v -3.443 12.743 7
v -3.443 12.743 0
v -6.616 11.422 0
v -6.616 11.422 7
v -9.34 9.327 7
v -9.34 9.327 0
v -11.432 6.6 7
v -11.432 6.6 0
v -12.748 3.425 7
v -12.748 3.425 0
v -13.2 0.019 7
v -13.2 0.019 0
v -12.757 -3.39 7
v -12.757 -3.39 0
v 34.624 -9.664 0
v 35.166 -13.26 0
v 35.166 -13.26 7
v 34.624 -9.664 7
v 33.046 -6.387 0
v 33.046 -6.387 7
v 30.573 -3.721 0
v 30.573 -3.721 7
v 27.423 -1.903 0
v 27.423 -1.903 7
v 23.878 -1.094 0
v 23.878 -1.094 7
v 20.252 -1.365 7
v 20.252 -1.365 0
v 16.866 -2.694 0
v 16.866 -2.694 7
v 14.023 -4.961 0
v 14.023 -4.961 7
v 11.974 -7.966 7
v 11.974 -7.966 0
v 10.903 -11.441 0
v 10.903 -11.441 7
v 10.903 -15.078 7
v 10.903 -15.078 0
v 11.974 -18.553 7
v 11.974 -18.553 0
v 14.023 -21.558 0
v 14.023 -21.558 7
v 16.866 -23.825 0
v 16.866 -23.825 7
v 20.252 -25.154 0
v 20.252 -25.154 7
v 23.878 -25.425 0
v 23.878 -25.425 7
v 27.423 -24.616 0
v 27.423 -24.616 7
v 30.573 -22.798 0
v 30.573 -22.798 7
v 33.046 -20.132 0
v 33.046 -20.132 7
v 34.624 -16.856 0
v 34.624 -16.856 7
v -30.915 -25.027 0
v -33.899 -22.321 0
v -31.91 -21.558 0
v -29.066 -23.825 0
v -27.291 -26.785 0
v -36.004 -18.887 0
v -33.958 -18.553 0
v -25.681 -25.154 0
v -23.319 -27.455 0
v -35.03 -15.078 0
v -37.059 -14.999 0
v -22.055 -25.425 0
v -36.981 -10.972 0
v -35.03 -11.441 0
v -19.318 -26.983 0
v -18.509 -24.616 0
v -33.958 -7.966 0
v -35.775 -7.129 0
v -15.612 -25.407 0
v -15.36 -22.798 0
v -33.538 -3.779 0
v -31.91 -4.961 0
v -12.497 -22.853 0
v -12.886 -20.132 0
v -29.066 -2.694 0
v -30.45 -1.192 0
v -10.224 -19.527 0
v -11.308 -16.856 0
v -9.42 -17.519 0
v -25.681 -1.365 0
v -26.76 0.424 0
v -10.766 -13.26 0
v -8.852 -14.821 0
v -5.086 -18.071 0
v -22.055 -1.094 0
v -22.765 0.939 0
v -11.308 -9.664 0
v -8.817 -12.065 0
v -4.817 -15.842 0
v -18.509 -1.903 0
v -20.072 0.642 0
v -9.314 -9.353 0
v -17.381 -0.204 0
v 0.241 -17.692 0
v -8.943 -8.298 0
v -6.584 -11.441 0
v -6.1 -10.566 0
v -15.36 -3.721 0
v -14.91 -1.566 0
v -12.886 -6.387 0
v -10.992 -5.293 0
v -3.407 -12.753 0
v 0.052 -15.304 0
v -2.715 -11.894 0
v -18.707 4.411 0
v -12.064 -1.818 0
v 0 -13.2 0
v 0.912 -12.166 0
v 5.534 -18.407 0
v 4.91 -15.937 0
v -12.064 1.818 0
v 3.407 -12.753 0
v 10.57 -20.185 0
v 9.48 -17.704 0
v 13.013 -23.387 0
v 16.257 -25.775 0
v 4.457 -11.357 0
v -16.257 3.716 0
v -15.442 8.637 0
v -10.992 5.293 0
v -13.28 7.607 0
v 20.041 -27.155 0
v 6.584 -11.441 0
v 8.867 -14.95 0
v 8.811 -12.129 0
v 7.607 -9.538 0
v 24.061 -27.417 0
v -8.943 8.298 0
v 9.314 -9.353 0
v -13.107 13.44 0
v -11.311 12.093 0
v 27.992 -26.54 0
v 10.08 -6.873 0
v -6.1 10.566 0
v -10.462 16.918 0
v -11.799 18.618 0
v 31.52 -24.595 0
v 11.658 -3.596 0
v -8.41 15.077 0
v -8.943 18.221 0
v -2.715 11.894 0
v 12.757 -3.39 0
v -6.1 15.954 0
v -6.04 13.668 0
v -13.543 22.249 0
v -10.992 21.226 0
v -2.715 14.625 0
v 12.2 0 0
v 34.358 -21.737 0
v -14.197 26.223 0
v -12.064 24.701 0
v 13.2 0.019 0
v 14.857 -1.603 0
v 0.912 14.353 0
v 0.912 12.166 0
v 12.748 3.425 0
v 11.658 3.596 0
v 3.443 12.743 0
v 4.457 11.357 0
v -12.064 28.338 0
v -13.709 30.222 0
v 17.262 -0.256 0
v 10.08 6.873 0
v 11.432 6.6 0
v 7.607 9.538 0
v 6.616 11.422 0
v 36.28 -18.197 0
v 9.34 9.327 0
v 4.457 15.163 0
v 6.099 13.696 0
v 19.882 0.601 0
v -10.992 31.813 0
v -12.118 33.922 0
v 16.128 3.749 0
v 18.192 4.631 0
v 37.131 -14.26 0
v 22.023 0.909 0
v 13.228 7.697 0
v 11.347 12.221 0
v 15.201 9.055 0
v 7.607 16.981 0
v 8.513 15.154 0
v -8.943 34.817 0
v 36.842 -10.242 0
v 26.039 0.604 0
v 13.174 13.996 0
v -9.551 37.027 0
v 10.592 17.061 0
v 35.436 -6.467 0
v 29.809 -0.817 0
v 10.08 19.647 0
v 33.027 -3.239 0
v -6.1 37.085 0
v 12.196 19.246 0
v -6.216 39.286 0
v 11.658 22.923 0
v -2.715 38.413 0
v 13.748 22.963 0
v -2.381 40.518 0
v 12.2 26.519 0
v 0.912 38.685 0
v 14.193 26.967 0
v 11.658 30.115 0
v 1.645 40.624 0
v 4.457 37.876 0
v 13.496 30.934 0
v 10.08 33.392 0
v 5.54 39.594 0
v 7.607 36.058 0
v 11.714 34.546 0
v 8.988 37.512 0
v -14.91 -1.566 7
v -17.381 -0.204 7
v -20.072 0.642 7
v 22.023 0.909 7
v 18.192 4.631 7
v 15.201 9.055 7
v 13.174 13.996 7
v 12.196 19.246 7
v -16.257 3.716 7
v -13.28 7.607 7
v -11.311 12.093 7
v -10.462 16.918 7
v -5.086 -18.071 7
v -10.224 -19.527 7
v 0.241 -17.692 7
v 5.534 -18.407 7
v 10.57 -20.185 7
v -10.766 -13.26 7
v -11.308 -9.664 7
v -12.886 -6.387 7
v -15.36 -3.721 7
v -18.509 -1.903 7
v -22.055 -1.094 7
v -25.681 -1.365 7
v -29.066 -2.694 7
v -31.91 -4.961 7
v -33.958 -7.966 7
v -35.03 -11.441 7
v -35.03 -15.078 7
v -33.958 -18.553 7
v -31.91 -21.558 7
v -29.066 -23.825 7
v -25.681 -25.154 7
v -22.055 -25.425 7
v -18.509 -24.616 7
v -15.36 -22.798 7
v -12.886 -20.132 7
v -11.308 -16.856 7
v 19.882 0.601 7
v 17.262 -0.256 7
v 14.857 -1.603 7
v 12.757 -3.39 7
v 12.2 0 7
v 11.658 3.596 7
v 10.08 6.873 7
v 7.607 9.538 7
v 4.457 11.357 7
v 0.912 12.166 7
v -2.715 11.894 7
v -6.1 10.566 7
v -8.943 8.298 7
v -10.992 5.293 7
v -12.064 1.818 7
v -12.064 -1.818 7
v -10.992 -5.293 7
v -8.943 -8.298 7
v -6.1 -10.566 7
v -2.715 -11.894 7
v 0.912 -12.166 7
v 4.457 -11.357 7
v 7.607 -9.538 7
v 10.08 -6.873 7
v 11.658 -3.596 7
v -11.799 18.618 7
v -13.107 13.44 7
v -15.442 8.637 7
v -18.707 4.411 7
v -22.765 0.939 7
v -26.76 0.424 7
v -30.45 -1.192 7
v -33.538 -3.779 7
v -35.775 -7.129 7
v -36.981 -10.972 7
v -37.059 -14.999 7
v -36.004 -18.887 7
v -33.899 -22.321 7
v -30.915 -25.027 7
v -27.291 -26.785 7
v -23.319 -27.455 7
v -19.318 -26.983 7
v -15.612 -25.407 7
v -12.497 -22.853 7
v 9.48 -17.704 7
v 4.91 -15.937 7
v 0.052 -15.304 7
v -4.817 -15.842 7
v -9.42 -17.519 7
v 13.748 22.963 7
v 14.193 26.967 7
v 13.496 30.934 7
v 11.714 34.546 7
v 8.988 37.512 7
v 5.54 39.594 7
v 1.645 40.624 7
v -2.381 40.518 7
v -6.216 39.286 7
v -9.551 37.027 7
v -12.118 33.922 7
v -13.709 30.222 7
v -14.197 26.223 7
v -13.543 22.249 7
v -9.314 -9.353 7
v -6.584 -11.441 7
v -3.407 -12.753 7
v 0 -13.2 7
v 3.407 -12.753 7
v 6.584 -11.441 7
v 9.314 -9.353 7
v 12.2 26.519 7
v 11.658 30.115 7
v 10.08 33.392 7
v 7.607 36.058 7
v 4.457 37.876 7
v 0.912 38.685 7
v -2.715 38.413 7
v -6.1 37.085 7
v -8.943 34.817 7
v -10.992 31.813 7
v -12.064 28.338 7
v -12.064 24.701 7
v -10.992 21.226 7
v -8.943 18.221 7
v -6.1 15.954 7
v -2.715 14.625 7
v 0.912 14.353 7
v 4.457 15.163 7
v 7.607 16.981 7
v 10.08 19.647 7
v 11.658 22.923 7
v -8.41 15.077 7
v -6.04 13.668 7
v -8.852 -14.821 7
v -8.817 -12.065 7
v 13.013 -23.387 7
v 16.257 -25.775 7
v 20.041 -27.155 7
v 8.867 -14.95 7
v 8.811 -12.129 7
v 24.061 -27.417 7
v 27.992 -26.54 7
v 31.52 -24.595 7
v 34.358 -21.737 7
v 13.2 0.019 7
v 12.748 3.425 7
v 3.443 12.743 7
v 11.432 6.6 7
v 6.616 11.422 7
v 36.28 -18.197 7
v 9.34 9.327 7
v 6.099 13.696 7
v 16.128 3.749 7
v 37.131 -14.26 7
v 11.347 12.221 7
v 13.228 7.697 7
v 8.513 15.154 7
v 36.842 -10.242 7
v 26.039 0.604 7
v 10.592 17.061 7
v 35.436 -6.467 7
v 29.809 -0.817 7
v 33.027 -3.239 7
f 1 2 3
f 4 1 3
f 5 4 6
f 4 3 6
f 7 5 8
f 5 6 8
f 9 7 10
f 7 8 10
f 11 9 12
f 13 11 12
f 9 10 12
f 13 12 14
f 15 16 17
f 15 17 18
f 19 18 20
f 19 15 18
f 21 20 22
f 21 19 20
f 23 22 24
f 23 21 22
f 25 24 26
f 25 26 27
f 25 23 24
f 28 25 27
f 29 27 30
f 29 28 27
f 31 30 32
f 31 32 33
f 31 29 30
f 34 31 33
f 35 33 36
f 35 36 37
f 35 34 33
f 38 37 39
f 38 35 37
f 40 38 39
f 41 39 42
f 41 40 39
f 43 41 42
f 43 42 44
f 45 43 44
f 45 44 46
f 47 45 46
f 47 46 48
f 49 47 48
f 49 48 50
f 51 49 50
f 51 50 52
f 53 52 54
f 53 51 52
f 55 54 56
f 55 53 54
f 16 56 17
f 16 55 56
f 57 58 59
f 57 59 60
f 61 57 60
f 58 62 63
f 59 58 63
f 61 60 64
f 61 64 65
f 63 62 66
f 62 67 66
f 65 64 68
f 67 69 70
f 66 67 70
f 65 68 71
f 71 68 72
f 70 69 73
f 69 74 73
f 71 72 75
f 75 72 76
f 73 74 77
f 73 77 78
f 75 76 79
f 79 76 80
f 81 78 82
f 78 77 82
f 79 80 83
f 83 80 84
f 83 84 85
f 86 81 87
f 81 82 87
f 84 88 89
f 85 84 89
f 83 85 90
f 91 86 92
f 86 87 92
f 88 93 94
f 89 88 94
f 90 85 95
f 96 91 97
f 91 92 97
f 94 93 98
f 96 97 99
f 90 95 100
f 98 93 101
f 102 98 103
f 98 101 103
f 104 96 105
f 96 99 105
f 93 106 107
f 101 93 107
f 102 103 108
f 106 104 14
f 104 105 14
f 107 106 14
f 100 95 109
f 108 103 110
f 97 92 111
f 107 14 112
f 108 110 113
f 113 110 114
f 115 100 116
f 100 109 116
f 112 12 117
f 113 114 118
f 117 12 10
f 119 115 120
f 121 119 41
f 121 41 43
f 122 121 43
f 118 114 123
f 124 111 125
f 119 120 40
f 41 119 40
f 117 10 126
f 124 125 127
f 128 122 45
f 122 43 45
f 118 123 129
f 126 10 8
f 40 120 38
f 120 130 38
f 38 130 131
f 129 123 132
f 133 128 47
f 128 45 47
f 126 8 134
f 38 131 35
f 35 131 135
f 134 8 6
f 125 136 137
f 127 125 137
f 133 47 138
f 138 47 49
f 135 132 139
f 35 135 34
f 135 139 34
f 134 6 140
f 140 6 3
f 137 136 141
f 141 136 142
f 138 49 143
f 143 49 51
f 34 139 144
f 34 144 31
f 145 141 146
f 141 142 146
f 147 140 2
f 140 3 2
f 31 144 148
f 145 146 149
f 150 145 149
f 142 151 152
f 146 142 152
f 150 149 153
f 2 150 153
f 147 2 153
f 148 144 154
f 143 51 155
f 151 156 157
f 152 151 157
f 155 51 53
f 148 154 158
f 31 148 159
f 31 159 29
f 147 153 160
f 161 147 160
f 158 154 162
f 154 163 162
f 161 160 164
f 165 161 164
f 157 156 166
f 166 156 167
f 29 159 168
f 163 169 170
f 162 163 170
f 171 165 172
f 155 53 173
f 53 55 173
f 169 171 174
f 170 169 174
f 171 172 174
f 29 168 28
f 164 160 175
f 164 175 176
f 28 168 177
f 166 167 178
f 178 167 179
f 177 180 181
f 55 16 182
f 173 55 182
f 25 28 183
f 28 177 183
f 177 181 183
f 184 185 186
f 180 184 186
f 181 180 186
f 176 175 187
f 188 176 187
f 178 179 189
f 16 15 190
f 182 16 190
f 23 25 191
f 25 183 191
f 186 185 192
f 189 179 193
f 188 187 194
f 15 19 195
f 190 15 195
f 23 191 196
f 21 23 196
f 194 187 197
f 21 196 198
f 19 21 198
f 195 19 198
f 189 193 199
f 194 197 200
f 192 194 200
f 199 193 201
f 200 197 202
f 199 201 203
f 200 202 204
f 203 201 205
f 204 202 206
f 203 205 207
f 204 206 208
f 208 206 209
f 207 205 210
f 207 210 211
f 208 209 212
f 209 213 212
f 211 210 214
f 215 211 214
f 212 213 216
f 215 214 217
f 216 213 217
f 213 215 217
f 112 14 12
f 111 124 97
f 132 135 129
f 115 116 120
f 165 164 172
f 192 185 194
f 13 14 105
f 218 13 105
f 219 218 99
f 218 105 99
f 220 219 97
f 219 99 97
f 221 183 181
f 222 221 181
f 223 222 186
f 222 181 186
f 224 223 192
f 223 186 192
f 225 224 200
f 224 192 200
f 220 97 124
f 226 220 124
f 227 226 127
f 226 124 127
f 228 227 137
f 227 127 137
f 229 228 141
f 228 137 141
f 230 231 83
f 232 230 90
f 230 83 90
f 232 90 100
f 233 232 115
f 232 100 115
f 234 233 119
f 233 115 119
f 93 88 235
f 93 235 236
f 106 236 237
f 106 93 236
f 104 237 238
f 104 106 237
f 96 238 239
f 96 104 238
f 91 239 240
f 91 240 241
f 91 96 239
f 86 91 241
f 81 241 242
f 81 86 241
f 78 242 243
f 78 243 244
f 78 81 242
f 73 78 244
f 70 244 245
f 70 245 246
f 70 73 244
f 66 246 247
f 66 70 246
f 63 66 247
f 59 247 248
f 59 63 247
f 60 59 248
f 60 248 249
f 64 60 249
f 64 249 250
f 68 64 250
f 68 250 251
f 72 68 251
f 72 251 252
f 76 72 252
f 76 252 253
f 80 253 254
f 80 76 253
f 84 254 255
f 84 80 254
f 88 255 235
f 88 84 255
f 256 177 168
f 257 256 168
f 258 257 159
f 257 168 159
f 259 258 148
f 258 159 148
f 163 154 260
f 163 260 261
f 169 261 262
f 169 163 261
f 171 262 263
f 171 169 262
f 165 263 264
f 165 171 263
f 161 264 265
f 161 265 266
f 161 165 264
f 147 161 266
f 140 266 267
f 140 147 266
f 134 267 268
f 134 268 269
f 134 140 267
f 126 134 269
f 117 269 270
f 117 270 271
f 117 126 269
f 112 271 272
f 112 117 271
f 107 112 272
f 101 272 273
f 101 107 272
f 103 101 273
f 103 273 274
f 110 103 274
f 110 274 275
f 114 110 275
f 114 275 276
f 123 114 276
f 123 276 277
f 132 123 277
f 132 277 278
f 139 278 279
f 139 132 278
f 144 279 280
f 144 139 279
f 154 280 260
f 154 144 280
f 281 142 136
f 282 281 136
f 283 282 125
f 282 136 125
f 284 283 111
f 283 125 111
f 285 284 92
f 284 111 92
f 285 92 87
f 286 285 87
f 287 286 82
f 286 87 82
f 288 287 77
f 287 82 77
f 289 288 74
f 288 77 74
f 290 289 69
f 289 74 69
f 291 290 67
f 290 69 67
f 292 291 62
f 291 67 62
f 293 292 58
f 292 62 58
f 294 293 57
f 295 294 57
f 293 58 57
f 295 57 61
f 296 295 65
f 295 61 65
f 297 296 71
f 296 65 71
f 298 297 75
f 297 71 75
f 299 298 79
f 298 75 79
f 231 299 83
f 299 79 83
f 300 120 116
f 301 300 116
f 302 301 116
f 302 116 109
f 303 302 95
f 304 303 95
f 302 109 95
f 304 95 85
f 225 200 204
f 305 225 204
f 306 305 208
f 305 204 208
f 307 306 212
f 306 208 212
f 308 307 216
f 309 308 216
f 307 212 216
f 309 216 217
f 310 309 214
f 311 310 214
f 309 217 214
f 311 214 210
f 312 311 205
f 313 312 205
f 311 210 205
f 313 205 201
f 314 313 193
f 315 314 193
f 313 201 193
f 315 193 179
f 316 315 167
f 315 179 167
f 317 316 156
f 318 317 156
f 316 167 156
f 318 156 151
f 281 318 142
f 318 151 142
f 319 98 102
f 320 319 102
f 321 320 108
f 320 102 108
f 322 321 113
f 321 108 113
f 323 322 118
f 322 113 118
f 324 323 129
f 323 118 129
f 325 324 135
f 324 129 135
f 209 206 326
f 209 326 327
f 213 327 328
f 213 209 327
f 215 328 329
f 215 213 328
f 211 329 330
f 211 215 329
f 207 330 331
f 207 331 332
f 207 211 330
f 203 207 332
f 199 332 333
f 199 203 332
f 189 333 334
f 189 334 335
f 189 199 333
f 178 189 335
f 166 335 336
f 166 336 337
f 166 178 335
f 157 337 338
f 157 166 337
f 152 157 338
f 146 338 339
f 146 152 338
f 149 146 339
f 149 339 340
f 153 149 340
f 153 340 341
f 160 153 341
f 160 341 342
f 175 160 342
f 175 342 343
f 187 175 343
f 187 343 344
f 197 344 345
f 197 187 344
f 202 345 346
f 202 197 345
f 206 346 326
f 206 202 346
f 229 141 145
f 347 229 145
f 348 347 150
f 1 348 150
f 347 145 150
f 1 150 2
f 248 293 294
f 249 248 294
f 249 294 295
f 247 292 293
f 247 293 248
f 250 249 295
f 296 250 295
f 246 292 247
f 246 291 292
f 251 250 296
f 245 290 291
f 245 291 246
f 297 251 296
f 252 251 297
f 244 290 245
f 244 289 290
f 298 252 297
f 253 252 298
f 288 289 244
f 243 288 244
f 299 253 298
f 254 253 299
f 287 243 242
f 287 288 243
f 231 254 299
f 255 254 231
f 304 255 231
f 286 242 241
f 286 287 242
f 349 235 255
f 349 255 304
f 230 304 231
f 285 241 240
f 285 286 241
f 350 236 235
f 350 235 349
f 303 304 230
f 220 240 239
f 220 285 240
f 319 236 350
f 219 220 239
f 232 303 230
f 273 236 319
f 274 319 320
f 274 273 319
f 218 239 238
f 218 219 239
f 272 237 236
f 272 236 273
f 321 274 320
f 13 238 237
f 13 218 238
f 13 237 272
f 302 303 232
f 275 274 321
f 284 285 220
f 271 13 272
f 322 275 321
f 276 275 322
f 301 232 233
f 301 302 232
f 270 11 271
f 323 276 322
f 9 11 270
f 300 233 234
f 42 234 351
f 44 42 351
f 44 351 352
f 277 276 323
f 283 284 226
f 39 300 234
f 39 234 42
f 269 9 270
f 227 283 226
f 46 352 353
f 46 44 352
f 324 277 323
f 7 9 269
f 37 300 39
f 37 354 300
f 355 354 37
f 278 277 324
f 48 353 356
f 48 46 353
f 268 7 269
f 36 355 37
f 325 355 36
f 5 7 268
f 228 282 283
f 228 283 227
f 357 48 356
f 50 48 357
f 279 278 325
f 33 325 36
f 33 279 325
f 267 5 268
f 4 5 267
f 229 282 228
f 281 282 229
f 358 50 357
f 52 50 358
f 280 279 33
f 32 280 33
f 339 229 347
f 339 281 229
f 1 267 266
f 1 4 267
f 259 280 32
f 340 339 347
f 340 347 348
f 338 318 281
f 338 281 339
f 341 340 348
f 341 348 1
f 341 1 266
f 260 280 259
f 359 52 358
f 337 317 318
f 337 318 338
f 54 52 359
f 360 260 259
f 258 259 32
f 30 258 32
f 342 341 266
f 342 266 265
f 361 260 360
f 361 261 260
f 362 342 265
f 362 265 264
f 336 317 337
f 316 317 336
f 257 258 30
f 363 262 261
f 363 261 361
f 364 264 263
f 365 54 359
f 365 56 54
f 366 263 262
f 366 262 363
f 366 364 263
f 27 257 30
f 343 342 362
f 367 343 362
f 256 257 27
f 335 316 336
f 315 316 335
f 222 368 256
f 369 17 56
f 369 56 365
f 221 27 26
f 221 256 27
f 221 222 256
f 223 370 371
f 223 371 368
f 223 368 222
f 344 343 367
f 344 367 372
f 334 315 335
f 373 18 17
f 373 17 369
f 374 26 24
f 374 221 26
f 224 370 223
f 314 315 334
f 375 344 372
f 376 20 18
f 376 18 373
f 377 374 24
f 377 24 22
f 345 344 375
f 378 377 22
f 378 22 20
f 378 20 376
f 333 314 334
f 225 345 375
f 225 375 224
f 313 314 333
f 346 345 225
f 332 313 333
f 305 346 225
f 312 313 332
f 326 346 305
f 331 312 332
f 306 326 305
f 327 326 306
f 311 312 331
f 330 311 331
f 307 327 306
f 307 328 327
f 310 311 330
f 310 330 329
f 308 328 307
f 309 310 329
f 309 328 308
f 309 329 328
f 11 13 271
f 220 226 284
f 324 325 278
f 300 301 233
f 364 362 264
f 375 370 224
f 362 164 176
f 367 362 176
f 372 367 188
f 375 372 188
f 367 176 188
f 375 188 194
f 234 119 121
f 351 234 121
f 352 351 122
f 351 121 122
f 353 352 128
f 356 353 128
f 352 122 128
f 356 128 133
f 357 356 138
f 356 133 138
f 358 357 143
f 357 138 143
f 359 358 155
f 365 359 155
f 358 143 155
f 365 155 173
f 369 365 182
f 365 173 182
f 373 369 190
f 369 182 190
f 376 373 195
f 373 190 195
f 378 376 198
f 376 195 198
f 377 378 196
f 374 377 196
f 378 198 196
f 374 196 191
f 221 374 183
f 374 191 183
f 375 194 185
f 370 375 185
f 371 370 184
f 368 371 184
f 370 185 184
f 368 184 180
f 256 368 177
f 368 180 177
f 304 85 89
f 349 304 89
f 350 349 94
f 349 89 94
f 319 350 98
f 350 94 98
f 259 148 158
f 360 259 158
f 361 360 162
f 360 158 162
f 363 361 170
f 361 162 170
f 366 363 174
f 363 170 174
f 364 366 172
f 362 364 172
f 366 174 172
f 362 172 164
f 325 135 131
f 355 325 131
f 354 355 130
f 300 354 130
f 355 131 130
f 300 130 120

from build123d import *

# Parameters (mm, degrees)
F0_R     = 12.2
F1_DEPTH = 7


with BuildPart() as f1:
    # F0 (on Top) → F1 (new body)
    with BuildSketch(Plane.XY):
        with BuildLine():
            ThreePointArc((-10.461899, 16.917701), (-7.259172, 14.314915), (-3.443284, 12.74299))
            ThreePointArc((-3.443284, 12.74299), (-11.431535, 6.6), (-12.757395, -3.389524))
            ThreePointArc((-12.757395, -3.389524), (-16.111427, -0.823731), (-20.071696, 0.642248))
            ThreePointArc((-20.071696, 0.642248), (-21.411446, 0.855021), (-22.765386, 0.938982))
            ThreePointArc((-22.765386, 0.938982), (-35.073825, -20.679014), (-10.224124, -19.526737))
            ThreePointArc((-10.224124, -19.526737), (-9.783892, -18.538255), (-9.420209, -17.51912))
            ThreePointArc((-9.420209, -17.51912), (-8.767494, -13.444085), (-9.314111, -9.353466))
            ThreePointArc((-9.314111, -9.353466), (0, -13.2), (9.314111, -9.353466))
            ThreePointArc((9.314111, -9.353466), (8.769085, -13.541039), (9.479645, -17.703722))
            ThreePointArc((9.479645, -17.703722), (9.965253, -18.970367), (10.569511, -20.184894))
            ThreePointArc((10.569511, -20.184894), (35.445464, -20.035316), (22.022712, 0.909018))
            ThreePointArc((22.022712, 0.909018), (20.946546, 0.796028), (19.882108, 0.60142))
            ThreePointArc((19.882108, 0.60142), (16.026666, -0.870831), (12.757395, -3.389524))
            ThreePointArc((12.757395, -3.389524), (11.431535, 6.6), (3.443284, 12.74299))
            ThreePointArc((3.443284, 12.74299), (7.342341, 14.36477), (10.592051, 17.061474))
            ThreePointArc((10.592051, 17.061474), (11.446193, 18.115346), (12.195875, 19.245912))
            ThreePointArc((12.195875, 19.245912), (-0.371639, 40.71433), (-11.798589, 18.617719))
            ThreePointArc((-11.798589, 18.617719), (-11.162654, 17.742227), (-10.461899, 16.917701))
        make_face()
        with Locations((-22.966296, -13.259597)):
            Circle(F0_R, mode=Mode.SUBTRACT)
        with Locations((22.966296, -13.259597)):
            Circle(F0_R, mode=Mode.SUBTRACT)
        Circle(F0_R, mode=Mode.SUBTRACT)
        with Locations((0, 26.519194)):
            Circle(F0_R, mode=Mode.SUBTRACT)
        with BuildLine():
            ThreePointArc((-20.071696, 0.642248), (-13.280016, 7.606885), (-10.461899, 16.917701))
            ThreePointArc((-10.461899, 16.917701), (-11.162654, 17.742227), (-11.798589, 18.617719))
            ThreePointArc((-11.798589, 18.617719), (-15.442187, 8.637052), (-22.765386, 0.938982))
            ThreePointArc((-22.765386, 0.938982), (-21.411446, 0.855021), (-20.071696, 0.642248))
        make_face()
        with BuildLine():
            ThreePointArc((22.022712, 0.909018), (15.201, 9.054801), (12.195875, 19.245912))
            ThreePointArc((12.195875, 19.245912), (11.446193, 18.115346), (10.592051, 17.061474))
            ThreePointArc((10.592051, 17.061474), (13.227764, 7.697389), (19.882108, 0.60142))
            ThreePointArc((19.882108, 0.60142), (20.946546, 0.796028), (22.022712, 0.909018))
        make_face()
        with BuildLine():
            ThreePointArc((-9.420209, -17.51912), (-9.783892, -18.538255), (-10.224124, -19.526737))
            ThreePointArc((-10.224124, -19.526737), (0.241187, -17.691853), (10.569511, -20.184894))
            ThreePointArc((10.569511, -20.184894), (9.965253, -18.970367), (9.479645, -17.703722))
            ThreePointArc((9.479645, -17.703722), (0.052253, -15.304274), (-9.420209, -17.51912))
        make_face()
    extrude(amount=F1_DEPTH)


solid = f1.part
